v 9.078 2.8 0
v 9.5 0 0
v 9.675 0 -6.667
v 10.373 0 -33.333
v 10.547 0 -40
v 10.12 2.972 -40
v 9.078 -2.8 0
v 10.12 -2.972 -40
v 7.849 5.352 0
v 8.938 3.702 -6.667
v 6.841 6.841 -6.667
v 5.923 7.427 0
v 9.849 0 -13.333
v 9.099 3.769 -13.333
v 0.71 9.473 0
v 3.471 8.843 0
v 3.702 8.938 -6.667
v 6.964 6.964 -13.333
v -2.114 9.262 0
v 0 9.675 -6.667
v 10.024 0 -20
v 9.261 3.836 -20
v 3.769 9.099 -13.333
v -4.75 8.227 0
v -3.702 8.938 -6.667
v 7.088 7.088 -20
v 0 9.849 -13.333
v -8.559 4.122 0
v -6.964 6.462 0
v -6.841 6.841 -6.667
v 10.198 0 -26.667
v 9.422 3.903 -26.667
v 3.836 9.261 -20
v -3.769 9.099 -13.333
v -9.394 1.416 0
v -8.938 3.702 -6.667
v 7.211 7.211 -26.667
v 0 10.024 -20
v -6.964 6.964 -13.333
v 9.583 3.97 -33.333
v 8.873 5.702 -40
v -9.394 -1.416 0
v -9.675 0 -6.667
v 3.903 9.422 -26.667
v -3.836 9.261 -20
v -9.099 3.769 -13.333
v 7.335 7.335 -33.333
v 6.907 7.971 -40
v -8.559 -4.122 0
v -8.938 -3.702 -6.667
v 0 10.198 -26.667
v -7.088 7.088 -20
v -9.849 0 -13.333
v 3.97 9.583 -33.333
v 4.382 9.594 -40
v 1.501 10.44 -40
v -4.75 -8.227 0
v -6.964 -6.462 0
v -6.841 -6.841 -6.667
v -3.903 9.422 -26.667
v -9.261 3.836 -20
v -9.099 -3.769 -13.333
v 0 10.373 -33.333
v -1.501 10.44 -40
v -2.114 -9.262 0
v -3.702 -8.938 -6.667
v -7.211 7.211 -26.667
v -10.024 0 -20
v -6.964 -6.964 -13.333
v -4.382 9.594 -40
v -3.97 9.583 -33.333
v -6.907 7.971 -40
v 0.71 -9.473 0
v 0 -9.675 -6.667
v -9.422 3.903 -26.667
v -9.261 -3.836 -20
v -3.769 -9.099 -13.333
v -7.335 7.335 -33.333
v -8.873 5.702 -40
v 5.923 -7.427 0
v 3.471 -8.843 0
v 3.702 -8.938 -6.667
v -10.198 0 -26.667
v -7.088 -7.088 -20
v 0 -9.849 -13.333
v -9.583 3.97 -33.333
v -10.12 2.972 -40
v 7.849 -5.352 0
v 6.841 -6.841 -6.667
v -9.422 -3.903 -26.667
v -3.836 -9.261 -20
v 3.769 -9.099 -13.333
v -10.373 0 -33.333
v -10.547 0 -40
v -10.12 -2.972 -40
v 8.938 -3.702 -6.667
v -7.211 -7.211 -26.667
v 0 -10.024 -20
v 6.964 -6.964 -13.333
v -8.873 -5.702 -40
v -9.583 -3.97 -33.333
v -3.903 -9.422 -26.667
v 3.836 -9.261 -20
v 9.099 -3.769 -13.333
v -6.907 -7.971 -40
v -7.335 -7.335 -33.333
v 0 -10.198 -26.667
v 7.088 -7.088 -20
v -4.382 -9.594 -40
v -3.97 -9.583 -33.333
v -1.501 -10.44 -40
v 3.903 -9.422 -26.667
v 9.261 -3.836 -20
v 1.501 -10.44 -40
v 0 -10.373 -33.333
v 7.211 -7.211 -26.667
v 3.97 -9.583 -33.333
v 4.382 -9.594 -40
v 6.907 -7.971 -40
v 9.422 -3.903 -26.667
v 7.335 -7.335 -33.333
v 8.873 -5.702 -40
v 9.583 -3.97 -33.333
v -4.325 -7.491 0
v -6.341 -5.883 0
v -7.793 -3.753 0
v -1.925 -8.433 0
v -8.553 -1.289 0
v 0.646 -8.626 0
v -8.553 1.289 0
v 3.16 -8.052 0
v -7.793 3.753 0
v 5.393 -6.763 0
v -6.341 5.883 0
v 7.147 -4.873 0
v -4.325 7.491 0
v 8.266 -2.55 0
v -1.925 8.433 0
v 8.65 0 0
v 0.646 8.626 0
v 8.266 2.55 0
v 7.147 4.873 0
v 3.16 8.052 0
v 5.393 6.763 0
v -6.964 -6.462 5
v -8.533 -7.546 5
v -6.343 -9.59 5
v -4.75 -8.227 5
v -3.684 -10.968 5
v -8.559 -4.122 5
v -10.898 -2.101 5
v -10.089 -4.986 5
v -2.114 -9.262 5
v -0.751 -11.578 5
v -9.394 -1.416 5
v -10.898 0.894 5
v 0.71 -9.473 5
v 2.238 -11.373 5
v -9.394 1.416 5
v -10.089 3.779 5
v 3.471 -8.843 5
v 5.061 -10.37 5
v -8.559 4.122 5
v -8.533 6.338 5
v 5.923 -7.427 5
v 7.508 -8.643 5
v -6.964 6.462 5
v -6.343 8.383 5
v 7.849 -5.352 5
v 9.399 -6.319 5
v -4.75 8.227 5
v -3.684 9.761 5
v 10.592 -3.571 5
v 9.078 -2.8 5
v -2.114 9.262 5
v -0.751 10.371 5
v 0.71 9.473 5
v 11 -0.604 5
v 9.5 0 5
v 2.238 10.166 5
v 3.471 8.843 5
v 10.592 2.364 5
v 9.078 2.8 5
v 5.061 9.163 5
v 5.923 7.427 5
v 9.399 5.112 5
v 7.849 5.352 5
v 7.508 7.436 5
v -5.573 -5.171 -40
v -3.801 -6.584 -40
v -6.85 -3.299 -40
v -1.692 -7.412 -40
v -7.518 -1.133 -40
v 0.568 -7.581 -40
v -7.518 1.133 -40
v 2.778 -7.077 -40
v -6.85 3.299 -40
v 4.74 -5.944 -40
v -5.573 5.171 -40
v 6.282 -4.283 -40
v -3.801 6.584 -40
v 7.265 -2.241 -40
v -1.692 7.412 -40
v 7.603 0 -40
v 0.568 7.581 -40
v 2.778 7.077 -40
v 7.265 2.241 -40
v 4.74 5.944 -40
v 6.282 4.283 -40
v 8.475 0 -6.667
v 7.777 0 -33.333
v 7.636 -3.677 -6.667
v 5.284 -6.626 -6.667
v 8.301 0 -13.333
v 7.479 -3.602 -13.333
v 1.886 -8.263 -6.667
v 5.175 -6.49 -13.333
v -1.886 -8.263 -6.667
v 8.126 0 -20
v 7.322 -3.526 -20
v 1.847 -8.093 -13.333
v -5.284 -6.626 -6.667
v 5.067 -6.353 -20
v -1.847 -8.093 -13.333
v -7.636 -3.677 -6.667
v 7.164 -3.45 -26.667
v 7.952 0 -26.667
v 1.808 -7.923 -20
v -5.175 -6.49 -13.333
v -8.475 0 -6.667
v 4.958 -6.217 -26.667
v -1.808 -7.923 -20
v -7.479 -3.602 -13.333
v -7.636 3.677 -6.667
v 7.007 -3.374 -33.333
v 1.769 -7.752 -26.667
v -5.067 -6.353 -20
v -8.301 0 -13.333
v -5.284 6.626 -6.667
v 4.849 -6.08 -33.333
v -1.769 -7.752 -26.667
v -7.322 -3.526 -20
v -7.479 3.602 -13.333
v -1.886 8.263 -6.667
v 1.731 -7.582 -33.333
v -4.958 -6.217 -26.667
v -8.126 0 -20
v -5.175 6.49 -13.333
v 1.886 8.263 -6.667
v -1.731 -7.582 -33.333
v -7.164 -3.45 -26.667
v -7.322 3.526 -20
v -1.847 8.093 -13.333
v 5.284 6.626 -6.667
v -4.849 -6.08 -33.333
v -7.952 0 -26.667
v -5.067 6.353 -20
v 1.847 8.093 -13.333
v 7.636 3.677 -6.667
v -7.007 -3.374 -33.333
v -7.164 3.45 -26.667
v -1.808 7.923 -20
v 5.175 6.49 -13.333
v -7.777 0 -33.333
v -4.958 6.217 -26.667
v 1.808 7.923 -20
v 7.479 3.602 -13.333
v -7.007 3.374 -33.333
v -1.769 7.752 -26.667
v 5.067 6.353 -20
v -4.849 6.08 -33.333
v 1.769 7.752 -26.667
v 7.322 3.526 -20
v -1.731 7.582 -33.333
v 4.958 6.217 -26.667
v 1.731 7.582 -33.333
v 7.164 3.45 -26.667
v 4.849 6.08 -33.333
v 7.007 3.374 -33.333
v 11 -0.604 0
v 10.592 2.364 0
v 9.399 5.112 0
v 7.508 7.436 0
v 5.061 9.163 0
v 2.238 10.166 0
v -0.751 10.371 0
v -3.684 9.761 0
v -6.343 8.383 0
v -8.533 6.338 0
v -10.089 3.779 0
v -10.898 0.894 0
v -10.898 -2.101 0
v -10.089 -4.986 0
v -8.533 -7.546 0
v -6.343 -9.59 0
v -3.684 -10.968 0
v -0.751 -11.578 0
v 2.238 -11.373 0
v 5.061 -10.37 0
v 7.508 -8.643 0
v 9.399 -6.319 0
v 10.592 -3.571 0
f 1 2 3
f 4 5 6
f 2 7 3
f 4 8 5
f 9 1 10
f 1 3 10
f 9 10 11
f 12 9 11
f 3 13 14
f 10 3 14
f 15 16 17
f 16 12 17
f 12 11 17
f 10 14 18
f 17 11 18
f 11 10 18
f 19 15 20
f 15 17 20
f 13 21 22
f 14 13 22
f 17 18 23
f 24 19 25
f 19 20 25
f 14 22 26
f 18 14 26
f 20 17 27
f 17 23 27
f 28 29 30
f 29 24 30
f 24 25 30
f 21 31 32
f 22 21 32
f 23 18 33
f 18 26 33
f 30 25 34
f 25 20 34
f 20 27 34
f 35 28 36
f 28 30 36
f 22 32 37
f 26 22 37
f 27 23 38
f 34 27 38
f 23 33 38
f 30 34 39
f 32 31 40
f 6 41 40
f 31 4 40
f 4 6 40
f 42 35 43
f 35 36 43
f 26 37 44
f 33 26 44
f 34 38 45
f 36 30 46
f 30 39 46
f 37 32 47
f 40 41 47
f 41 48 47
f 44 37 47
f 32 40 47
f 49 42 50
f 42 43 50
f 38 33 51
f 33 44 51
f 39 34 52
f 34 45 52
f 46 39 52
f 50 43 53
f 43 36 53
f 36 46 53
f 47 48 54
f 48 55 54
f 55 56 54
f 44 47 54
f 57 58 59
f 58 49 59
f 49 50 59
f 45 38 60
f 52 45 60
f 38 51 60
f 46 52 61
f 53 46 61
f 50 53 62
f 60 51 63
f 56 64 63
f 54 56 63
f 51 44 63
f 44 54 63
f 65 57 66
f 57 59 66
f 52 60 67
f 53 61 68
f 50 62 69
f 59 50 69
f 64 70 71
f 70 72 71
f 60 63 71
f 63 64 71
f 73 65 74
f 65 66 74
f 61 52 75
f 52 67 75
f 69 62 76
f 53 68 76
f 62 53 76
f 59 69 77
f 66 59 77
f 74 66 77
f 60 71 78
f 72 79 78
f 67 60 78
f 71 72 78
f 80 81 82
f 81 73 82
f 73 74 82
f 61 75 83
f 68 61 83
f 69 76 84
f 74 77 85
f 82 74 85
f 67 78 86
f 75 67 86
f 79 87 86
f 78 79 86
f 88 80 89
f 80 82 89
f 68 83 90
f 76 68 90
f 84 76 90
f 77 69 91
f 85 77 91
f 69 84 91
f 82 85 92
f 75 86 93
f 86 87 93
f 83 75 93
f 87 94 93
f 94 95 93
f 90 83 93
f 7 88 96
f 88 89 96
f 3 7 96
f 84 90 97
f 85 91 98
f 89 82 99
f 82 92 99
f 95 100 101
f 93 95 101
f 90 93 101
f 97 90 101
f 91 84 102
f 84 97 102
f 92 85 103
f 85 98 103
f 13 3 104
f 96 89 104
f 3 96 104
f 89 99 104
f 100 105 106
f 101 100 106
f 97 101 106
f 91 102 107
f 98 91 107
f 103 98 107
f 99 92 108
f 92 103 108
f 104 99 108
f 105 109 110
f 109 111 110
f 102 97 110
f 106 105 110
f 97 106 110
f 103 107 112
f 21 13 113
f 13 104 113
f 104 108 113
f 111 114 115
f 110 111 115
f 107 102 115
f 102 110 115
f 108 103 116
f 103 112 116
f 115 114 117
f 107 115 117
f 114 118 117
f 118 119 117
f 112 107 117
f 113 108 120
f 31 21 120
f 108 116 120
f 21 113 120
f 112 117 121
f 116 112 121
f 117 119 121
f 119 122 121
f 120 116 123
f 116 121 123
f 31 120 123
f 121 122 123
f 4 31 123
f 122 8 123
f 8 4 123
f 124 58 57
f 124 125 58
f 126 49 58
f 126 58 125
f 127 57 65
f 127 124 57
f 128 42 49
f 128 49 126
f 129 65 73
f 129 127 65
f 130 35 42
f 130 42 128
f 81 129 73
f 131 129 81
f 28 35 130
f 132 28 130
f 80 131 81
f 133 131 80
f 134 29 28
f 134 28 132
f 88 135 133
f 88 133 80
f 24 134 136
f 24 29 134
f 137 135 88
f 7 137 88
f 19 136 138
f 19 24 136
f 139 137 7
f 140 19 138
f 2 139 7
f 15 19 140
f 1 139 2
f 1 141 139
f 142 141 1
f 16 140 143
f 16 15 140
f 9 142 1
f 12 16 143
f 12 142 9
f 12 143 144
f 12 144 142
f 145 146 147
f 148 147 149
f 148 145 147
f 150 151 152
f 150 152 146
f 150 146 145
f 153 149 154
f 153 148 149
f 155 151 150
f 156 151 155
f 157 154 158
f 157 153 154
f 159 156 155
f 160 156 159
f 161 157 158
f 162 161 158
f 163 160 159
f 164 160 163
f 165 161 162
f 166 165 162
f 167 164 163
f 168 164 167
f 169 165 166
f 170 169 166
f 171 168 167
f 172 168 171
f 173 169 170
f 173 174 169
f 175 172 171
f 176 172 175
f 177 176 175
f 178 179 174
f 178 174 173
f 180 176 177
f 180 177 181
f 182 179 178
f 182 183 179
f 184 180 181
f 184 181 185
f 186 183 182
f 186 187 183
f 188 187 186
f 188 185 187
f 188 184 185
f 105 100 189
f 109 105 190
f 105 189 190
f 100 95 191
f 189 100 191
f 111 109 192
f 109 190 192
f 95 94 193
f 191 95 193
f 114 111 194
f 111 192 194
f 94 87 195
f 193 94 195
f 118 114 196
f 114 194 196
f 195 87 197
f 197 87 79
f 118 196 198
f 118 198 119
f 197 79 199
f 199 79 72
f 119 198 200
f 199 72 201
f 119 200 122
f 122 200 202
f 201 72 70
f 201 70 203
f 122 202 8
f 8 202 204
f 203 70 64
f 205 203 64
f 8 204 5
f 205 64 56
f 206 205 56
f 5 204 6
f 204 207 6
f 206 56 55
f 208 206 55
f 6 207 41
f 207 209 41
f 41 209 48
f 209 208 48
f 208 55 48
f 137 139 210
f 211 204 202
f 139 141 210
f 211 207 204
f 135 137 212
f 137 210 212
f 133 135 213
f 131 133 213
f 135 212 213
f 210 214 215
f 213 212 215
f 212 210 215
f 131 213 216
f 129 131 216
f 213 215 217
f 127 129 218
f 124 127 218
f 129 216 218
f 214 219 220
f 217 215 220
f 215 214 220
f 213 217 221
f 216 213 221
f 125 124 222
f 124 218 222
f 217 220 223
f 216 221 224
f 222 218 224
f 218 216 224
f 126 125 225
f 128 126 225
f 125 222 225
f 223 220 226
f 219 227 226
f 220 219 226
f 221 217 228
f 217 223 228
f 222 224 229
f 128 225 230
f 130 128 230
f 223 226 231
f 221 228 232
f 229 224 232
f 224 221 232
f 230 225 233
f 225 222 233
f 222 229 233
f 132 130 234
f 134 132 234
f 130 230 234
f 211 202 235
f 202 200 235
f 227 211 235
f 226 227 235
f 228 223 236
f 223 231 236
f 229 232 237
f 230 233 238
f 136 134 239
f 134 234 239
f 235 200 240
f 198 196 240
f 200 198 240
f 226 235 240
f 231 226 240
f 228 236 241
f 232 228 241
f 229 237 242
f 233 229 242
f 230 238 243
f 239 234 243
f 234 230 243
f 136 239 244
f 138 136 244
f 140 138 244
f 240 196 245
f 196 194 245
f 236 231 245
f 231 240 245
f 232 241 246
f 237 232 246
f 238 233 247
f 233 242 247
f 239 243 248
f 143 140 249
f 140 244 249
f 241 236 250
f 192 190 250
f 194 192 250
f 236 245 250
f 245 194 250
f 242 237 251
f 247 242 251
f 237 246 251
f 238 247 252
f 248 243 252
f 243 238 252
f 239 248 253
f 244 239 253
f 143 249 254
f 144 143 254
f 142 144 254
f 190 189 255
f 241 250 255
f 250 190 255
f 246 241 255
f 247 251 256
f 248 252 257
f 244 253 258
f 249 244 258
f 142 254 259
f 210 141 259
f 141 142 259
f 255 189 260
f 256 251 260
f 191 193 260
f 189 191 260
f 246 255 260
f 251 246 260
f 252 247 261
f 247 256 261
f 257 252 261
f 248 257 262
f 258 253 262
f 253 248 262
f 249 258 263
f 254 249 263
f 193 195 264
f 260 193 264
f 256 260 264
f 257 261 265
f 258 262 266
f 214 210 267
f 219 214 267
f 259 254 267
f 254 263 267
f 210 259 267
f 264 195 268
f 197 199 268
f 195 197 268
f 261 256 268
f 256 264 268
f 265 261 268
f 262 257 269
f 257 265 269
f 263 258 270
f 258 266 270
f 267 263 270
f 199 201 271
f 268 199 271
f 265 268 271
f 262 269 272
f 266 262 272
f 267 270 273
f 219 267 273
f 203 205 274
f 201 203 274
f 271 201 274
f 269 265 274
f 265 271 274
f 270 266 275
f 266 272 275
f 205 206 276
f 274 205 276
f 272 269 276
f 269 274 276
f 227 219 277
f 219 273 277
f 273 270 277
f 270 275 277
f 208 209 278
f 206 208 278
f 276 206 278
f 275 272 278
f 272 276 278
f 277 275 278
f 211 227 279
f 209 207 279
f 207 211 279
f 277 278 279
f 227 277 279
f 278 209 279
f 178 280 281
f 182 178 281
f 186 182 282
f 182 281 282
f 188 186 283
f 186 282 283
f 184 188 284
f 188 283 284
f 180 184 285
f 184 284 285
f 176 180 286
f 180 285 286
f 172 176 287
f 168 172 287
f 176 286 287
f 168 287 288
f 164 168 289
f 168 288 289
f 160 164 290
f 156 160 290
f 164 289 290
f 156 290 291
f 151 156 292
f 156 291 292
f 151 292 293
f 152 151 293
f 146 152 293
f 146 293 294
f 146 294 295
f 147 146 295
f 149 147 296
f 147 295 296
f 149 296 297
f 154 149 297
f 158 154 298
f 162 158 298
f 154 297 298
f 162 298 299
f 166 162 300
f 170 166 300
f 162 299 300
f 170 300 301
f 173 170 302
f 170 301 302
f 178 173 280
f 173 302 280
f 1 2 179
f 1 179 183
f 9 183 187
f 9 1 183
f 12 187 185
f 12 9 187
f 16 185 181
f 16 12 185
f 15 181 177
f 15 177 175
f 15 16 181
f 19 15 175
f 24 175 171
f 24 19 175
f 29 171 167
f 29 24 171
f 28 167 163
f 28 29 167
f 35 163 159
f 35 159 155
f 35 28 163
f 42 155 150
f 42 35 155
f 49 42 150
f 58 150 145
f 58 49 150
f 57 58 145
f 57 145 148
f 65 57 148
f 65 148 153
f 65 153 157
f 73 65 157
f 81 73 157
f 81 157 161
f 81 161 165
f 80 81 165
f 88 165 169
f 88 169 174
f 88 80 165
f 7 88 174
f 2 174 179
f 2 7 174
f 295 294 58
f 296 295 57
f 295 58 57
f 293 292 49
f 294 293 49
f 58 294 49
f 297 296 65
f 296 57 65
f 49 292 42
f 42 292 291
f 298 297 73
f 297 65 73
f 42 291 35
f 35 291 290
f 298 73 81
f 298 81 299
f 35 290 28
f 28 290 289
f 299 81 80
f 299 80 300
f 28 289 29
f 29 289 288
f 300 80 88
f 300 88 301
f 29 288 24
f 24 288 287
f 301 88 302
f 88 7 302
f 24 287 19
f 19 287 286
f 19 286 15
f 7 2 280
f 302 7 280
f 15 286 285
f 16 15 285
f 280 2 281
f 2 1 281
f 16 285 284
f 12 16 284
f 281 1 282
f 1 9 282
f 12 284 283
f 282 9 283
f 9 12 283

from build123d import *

# Parameters (mm, degrees)
F0_R     = 9.5
F0_R_2   = 8.65
F1_DEPTH = 40
F1_TAPER = -1.5
F0_R_3   = 11
F2_DEPTH = 5


with BuildPart() as f1:
    # F0 (on Top) → F1 (new body)
    with BuildSketch(Plane.XY):
        Circle(F0_R)
        Circle(F0_R_2, mode=Mode.SUBTRACT)
    extrude(amount=-F1_DEPTH, taper=F1_TAPER)

    # F0 (on Top) → F2 (join)
    with BuildSketch(Plane.XY):
        with Locations((0, -0.6035432452)):
            Circle(F0_R_3)
        Circle(F0_R, mode=Mode.SUBTRACT)
    extrude(amount=F2_DEPTH)


solid = f1.part
